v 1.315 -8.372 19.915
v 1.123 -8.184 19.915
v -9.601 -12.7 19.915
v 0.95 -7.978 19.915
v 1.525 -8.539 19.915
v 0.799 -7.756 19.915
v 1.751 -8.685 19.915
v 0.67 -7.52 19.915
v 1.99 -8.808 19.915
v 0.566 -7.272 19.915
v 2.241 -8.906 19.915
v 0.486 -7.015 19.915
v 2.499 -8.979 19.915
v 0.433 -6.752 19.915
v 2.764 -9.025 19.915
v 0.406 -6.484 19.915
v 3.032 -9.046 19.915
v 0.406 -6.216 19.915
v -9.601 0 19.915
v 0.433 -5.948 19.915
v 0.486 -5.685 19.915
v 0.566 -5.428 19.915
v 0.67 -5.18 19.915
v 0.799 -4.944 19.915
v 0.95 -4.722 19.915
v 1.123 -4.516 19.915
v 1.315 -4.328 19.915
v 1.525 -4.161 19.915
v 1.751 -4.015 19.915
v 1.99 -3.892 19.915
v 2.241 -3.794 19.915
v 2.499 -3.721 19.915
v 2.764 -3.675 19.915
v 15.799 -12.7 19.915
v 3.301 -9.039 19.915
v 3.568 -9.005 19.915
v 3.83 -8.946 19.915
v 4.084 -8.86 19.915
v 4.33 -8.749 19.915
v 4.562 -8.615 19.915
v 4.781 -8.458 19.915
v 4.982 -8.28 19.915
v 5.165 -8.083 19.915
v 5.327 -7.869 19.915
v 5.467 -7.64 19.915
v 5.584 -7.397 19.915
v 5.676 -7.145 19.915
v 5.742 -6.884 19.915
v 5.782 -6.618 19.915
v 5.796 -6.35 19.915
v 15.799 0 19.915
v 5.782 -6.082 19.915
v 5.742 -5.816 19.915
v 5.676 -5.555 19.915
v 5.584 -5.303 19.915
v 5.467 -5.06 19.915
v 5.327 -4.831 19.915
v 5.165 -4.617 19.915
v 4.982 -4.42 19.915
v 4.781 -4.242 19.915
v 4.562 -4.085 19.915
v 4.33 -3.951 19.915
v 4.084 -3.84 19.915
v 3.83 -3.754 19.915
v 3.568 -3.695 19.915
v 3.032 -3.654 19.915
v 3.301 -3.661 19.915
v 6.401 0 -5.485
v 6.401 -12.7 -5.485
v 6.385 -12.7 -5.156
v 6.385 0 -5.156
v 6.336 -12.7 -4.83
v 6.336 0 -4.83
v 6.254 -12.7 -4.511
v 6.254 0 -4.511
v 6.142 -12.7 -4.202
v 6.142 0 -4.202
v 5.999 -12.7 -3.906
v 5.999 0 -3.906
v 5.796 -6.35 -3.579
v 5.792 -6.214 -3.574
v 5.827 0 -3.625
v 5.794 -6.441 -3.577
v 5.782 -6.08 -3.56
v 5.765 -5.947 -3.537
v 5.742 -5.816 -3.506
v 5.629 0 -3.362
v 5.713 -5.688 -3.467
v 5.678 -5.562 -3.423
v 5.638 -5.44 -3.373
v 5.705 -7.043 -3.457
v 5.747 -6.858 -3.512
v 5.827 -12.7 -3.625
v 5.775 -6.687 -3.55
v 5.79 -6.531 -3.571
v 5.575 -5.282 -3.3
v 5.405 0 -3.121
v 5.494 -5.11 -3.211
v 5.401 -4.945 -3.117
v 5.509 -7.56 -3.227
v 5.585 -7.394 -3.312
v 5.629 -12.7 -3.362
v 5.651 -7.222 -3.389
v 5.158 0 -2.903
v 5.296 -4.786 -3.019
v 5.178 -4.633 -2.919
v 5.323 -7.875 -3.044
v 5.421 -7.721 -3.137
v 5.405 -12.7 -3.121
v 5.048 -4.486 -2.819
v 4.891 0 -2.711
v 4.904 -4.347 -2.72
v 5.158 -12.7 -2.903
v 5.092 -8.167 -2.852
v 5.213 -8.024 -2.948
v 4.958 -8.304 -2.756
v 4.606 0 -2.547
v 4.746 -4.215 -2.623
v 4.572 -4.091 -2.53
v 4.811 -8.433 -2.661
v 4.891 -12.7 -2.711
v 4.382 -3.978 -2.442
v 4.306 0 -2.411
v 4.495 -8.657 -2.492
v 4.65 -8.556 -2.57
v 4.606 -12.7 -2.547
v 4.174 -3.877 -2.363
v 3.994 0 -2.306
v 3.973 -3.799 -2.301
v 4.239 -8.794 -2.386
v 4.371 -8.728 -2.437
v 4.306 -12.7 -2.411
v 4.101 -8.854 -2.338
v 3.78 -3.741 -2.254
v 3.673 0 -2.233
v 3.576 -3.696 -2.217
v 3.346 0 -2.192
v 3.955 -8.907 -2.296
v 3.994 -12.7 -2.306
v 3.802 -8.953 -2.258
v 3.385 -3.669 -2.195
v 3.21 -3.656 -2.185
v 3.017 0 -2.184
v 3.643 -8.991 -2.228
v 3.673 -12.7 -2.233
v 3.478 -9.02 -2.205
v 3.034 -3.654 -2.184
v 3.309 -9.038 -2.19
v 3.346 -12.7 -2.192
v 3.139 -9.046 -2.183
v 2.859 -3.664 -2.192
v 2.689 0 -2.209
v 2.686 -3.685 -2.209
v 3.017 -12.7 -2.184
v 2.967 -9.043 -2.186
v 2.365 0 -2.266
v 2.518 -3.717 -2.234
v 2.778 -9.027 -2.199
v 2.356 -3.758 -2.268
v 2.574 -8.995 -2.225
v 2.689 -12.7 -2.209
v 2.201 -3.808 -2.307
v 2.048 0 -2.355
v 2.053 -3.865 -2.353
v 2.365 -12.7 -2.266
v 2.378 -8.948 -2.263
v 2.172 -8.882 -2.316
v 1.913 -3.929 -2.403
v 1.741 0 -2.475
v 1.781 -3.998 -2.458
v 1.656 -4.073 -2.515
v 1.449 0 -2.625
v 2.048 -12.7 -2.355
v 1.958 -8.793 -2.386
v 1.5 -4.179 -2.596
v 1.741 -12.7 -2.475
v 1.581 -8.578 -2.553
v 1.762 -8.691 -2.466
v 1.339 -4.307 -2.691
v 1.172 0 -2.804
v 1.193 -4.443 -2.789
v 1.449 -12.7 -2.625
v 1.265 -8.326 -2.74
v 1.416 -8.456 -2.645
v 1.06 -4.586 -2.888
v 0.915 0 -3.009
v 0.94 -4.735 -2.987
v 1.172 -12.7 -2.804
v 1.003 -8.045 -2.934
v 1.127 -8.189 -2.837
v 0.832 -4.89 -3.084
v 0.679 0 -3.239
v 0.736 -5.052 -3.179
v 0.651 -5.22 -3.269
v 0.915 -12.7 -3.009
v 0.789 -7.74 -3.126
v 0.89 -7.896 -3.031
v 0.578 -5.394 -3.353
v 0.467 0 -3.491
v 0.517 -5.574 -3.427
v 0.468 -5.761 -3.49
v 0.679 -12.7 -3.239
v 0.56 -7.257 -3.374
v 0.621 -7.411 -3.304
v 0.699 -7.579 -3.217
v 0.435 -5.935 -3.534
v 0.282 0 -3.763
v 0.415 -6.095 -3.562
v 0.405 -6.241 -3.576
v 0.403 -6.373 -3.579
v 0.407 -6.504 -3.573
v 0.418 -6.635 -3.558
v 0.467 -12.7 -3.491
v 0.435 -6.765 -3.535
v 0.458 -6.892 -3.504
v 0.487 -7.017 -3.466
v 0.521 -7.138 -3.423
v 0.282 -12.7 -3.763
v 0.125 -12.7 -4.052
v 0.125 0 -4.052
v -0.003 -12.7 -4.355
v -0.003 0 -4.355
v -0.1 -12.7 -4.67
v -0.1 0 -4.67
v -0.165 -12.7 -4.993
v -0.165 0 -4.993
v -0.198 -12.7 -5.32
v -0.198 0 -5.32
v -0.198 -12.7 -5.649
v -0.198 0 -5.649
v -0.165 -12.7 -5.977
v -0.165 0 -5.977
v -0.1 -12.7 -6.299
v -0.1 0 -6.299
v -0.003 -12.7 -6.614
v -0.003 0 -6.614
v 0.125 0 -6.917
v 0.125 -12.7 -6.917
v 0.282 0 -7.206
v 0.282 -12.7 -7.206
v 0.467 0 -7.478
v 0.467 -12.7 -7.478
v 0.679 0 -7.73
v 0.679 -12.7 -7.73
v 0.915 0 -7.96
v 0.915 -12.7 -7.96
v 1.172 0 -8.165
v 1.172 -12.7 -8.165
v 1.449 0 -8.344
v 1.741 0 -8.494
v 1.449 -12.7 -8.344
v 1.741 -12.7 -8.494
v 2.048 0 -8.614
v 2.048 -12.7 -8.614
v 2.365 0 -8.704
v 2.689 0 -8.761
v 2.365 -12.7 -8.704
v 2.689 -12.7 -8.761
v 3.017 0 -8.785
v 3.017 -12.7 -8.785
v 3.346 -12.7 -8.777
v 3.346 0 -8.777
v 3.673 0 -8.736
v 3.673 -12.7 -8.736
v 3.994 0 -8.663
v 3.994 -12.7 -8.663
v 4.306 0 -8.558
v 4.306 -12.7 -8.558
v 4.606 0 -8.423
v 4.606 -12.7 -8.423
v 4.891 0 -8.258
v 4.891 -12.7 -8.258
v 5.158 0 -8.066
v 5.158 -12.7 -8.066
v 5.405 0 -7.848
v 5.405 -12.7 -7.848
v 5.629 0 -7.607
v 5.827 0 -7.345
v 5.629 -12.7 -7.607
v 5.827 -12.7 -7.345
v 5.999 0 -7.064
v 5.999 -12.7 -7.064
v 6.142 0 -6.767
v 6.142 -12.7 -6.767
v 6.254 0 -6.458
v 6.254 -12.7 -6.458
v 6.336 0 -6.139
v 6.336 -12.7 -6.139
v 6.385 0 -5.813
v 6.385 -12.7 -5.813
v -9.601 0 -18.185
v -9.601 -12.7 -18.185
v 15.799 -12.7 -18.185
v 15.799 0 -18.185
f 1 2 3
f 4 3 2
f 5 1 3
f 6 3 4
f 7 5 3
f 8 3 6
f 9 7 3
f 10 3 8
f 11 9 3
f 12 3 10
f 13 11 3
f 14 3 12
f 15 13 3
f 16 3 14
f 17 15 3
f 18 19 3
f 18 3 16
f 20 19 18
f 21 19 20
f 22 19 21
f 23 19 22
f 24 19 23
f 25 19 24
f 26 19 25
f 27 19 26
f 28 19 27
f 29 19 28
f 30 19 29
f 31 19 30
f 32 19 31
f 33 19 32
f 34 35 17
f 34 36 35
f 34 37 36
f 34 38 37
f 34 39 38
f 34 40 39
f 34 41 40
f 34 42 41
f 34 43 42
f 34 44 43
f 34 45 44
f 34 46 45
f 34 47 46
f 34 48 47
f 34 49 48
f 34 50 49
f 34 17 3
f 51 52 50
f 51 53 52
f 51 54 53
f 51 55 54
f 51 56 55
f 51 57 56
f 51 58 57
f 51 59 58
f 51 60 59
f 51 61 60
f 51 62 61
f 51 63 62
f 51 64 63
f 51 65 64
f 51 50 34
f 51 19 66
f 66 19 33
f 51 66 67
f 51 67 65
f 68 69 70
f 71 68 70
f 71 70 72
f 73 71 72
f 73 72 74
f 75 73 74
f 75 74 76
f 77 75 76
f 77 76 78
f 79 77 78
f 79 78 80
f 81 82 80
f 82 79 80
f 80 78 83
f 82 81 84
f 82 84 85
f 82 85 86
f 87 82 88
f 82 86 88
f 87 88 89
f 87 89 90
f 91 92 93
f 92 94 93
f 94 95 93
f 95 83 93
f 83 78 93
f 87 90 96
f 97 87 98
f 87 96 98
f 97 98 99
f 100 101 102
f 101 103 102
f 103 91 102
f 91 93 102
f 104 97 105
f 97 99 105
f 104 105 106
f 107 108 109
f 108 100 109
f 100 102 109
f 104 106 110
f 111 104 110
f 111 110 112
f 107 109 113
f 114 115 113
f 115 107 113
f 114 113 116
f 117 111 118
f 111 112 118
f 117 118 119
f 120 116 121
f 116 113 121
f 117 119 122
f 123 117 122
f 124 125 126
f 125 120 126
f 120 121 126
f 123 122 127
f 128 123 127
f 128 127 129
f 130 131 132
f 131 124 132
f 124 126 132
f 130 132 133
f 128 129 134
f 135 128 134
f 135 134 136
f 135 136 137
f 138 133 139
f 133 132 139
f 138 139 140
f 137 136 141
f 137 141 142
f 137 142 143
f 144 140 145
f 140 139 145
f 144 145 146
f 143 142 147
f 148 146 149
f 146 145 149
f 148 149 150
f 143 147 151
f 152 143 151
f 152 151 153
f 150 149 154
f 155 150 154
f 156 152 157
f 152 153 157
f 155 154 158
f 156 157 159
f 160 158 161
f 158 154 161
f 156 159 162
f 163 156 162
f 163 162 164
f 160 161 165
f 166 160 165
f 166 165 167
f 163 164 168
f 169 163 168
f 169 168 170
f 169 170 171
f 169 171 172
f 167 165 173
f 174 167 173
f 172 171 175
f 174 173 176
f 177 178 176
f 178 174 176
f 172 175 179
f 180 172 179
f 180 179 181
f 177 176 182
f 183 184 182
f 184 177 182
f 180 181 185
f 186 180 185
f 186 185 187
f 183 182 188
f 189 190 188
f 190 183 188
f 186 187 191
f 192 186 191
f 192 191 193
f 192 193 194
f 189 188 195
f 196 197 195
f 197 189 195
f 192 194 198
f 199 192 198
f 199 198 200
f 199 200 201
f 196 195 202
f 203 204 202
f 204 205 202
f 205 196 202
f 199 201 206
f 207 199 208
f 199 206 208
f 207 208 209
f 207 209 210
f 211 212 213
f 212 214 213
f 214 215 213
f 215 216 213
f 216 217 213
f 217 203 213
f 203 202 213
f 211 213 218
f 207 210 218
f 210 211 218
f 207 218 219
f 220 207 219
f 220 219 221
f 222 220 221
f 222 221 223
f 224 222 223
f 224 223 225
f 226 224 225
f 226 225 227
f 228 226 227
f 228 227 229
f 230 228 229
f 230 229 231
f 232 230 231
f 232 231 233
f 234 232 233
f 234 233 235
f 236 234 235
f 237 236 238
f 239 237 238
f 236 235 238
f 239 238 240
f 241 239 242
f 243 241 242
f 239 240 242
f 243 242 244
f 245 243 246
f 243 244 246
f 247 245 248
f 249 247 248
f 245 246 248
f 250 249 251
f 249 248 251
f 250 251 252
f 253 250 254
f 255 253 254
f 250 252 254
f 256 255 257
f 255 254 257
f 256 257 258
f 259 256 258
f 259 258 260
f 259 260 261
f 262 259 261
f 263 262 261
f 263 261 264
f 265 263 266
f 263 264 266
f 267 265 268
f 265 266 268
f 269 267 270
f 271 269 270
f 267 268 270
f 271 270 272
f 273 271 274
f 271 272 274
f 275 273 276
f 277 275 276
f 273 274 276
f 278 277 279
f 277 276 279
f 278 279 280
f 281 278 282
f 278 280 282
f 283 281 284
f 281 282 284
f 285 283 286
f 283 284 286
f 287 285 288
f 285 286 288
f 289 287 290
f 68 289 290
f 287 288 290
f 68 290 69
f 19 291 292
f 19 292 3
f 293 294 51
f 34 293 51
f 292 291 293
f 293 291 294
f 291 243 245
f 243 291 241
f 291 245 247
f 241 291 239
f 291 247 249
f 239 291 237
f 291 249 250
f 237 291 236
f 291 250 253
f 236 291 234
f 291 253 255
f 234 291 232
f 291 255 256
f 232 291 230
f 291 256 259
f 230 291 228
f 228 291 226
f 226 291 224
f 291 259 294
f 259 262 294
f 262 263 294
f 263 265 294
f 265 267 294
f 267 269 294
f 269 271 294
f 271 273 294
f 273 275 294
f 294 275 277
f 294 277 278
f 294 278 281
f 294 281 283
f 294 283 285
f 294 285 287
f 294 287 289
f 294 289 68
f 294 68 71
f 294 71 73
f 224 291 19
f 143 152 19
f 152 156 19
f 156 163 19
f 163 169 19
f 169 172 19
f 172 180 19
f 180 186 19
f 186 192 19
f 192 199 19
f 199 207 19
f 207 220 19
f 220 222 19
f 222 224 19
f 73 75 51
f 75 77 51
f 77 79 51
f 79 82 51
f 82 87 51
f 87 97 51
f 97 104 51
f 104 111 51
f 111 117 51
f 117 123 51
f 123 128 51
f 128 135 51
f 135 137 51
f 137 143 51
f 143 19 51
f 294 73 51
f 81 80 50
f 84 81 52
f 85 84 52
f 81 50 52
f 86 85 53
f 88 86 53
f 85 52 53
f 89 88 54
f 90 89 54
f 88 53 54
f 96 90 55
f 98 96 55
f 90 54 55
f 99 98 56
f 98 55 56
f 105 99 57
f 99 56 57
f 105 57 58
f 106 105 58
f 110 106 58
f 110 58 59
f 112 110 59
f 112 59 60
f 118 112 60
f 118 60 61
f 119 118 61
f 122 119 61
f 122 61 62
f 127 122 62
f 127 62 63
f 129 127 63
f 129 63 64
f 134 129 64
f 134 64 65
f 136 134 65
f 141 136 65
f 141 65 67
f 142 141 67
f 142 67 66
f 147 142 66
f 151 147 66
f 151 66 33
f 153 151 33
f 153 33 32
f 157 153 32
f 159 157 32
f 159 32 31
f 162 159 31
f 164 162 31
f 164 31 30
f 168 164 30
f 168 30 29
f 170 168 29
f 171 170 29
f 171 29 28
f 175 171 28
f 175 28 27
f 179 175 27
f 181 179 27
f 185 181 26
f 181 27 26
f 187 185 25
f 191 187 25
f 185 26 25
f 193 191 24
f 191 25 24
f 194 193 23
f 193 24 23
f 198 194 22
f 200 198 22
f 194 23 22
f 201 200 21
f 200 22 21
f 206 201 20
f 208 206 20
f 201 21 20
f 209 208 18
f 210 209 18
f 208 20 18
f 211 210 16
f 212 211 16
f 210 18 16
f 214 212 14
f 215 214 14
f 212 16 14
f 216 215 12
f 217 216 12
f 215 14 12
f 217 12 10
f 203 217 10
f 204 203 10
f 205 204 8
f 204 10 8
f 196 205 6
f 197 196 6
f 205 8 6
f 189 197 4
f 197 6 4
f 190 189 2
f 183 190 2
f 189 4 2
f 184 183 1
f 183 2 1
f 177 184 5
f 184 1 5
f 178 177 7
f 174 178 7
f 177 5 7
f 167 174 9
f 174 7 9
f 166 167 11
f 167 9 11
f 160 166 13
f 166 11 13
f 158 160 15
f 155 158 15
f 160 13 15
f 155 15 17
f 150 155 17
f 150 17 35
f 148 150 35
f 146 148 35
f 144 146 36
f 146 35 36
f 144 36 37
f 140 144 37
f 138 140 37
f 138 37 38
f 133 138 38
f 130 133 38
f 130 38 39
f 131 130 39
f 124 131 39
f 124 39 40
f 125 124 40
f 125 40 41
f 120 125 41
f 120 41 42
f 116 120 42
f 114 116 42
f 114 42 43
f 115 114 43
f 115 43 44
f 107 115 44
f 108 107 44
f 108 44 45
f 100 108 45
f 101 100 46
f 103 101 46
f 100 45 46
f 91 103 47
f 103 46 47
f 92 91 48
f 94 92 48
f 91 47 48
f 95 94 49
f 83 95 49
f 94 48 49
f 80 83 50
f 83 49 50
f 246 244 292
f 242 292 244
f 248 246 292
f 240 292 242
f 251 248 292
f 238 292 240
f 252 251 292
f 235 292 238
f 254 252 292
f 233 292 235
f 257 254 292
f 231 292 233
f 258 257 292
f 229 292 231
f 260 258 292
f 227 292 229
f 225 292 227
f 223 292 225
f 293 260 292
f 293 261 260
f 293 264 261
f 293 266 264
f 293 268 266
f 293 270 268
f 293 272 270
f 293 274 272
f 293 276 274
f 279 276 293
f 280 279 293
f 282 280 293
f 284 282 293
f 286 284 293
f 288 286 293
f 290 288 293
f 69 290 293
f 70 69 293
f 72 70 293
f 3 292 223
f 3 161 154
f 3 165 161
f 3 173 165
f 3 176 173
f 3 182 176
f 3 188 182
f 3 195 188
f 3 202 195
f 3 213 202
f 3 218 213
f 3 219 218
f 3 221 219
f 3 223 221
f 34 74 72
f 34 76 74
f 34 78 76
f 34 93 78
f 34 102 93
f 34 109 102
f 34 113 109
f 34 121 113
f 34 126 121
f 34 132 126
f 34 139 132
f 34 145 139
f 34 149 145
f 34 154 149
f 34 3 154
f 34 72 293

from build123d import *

# Parameters (mm, degrees)
F0_W     = 25.4
F0_H     = 38.1
F1_DEPTH = 12.7
F2_R     = 3.301742
F3_DEPTH = 25.4
F4_R     = 2.696389
F5_DEPTH = 25.4


with BuildPart() as f1:
    # F0 (on Front) → F1 (new body)
    with BuildSketch(Plane.XZ):
        with Locations((3.099383, 0.865355)):
            Rectangle(F0_W, F0_H)
    extrude(amount=F1_DEPTH)

    # F2 (on face) → F3 (cut)
    with BuildSketch(Plane.XZ.offset(12.7)):
        with Locations((3.099383, -5.484645)):
            Circle(F2_R)
    extrude(amount=-F3_DEPTH, mode=Mode.SUBTRACT)

    # F4 (on face) → F5 (cut)
    with BuildSketch(Plane.XY.offset(19.915355)):
        with Locations((3.099383, -6.35)):
            Circle(F4_R)
    extrude(amount=-F5_DEPTH, mode=Mode.SUBTRACT)


solid = f1.part
